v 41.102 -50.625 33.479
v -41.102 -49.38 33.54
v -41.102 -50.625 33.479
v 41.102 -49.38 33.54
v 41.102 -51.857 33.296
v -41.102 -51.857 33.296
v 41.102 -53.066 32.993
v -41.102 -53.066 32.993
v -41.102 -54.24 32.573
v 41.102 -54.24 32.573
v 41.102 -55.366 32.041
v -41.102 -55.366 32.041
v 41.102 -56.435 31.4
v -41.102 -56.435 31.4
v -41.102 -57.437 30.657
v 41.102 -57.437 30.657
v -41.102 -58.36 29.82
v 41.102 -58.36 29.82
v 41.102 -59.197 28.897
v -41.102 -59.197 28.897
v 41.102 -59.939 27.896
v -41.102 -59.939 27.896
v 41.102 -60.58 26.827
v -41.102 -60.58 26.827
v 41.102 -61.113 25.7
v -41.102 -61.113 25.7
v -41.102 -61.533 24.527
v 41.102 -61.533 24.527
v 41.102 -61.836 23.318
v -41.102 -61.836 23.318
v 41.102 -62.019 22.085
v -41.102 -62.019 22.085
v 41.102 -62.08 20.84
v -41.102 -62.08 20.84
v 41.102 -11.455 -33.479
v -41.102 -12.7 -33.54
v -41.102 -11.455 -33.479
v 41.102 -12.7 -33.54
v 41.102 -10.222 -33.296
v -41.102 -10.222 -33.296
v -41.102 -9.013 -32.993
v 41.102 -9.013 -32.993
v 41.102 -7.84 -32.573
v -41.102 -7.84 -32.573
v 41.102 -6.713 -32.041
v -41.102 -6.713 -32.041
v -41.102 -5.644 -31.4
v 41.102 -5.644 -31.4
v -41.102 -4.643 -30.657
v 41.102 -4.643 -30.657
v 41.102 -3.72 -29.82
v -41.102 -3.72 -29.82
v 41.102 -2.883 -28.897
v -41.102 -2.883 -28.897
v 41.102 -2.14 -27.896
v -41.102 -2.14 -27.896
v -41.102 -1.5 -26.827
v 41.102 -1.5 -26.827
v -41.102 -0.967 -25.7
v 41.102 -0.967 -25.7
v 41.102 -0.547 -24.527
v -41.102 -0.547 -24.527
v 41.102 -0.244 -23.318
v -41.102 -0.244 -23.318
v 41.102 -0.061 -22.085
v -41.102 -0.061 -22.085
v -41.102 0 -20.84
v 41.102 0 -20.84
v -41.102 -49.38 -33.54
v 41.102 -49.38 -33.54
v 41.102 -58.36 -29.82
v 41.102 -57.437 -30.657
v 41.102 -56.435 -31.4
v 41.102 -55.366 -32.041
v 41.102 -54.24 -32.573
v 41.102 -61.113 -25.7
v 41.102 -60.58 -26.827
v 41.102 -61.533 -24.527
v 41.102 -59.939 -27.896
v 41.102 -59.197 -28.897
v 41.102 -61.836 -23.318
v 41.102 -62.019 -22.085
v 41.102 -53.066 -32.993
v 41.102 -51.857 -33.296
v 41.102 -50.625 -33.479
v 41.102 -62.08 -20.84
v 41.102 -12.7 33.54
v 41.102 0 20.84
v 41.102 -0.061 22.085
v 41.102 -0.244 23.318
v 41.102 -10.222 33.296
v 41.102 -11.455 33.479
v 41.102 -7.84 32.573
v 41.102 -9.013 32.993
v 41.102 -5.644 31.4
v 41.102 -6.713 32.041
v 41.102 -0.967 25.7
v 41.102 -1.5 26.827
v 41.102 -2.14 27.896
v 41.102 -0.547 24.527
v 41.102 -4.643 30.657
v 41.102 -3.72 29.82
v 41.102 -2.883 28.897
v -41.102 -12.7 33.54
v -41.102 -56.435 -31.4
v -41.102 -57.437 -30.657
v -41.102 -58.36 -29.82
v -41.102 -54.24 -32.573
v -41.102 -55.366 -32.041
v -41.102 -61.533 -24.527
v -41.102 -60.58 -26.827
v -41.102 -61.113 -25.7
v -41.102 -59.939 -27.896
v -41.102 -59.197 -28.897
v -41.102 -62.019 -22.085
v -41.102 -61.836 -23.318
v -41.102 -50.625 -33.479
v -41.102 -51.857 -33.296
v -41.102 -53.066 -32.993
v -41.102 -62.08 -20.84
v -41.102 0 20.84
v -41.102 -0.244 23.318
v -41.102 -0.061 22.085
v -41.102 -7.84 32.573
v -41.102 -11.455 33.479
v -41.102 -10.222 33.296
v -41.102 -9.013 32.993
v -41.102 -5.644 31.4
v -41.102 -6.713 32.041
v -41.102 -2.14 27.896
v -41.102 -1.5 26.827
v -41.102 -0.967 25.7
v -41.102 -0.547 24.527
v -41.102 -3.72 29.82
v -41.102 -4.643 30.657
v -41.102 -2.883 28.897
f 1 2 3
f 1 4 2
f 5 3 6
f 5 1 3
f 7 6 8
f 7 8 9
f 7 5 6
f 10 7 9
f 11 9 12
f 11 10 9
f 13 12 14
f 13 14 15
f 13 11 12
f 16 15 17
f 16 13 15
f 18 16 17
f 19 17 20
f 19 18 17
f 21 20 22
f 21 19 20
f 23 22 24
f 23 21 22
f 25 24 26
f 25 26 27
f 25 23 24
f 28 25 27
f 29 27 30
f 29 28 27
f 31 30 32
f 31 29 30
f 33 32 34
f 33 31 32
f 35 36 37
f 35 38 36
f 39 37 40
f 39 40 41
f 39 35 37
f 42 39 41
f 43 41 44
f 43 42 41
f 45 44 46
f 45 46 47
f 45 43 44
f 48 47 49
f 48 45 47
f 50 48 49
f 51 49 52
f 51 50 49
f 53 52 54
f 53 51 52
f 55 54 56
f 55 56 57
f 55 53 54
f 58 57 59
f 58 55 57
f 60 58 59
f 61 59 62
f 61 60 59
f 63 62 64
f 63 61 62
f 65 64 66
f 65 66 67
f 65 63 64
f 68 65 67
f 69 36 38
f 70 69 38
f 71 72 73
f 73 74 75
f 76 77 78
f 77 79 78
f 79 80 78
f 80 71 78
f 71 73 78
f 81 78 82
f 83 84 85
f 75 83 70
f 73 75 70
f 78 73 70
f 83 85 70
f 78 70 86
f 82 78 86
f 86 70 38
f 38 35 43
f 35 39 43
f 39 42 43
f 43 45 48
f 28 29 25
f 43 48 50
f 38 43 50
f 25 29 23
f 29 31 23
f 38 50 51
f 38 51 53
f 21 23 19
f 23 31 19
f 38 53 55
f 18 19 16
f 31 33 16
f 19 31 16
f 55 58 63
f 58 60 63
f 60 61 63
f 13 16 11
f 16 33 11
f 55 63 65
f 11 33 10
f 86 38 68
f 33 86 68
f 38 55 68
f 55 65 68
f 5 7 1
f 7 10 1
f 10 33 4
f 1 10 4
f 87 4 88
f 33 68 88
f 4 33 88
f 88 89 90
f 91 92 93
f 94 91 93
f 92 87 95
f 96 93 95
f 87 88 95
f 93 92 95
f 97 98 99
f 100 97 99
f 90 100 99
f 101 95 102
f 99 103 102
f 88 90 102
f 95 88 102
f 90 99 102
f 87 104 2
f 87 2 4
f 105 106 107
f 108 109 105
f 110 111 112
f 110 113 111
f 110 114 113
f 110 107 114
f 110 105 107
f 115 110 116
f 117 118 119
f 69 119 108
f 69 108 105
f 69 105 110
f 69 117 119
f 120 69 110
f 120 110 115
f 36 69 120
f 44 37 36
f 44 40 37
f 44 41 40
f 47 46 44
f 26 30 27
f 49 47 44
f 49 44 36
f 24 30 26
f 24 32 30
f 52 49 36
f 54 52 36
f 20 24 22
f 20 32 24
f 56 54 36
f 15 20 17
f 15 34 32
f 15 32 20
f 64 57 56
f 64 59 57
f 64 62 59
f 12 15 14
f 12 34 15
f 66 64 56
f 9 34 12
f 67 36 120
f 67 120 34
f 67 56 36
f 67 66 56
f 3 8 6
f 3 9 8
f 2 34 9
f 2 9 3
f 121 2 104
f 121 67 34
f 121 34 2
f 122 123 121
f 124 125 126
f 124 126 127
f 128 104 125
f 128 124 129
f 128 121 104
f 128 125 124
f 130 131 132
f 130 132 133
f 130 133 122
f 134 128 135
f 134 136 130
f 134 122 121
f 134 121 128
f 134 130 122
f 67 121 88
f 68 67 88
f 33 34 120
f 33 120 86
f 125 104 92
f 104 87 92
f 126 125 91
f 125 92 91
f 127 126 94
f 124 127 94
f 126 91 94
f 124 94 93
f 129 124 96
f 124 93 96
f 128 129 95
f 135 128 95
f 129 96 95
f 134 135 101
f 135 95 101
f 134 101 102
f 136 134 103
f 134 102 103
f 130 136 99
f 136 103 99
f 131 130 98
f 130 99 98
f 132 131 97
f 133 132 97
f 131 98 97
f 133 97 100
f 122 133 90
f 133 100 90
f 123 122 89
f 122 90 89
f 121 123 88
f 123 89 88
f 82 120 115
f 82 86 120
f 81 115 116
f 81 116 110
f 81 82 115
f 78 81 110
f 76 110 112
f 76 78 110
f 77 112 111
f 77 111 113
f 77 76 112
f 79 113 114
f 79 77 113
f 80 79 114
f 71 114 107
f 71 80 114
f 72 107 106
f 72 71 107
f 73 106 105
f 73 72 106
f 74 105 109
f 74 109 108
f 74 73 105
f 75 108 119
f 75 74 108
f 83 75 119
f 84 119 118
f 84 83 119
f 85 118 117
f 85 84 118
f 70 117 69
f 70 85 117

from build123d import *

# Parameters (mm, degrees)
F0_W     = 82.204894
F0_H     = 67.080438
F1_DEPTH = 62.079741
F2_R     = 12.7
F3_R     = 12.7
F4_R     = 12.7


with BuildPart() as f1:
    # F0 (on Front) → F1 (new body)
    with BuildSketch(Plane.XZ):
        Rectangle(F0_W, F0_H)
    extrude(amount=F1_DEPTH)

    # F2
    f2_edges = [f1.edges().sort_by_distance(p)[0] for p in [
        (0, -62.079741, 33.540219),
    ]]
    fillet(f2_edges, radius=F2_R)

    # F3
    f3_edges = [f1.edges().sort_by_distance(p)[0] for p in [
        (0, -62.079741, -33.540219),
    ]]
    fillet(f3_edges, radius=F3_R)

    # F4
    f4_edges = [f1.edges().sort_by_distance(p)[0] for p in [
        (0, 0, -33.540219),
        (0, 0, 33.540219),
    ]]
    fillet(f4_edges, radius=F4_R)


solid = f1.part
